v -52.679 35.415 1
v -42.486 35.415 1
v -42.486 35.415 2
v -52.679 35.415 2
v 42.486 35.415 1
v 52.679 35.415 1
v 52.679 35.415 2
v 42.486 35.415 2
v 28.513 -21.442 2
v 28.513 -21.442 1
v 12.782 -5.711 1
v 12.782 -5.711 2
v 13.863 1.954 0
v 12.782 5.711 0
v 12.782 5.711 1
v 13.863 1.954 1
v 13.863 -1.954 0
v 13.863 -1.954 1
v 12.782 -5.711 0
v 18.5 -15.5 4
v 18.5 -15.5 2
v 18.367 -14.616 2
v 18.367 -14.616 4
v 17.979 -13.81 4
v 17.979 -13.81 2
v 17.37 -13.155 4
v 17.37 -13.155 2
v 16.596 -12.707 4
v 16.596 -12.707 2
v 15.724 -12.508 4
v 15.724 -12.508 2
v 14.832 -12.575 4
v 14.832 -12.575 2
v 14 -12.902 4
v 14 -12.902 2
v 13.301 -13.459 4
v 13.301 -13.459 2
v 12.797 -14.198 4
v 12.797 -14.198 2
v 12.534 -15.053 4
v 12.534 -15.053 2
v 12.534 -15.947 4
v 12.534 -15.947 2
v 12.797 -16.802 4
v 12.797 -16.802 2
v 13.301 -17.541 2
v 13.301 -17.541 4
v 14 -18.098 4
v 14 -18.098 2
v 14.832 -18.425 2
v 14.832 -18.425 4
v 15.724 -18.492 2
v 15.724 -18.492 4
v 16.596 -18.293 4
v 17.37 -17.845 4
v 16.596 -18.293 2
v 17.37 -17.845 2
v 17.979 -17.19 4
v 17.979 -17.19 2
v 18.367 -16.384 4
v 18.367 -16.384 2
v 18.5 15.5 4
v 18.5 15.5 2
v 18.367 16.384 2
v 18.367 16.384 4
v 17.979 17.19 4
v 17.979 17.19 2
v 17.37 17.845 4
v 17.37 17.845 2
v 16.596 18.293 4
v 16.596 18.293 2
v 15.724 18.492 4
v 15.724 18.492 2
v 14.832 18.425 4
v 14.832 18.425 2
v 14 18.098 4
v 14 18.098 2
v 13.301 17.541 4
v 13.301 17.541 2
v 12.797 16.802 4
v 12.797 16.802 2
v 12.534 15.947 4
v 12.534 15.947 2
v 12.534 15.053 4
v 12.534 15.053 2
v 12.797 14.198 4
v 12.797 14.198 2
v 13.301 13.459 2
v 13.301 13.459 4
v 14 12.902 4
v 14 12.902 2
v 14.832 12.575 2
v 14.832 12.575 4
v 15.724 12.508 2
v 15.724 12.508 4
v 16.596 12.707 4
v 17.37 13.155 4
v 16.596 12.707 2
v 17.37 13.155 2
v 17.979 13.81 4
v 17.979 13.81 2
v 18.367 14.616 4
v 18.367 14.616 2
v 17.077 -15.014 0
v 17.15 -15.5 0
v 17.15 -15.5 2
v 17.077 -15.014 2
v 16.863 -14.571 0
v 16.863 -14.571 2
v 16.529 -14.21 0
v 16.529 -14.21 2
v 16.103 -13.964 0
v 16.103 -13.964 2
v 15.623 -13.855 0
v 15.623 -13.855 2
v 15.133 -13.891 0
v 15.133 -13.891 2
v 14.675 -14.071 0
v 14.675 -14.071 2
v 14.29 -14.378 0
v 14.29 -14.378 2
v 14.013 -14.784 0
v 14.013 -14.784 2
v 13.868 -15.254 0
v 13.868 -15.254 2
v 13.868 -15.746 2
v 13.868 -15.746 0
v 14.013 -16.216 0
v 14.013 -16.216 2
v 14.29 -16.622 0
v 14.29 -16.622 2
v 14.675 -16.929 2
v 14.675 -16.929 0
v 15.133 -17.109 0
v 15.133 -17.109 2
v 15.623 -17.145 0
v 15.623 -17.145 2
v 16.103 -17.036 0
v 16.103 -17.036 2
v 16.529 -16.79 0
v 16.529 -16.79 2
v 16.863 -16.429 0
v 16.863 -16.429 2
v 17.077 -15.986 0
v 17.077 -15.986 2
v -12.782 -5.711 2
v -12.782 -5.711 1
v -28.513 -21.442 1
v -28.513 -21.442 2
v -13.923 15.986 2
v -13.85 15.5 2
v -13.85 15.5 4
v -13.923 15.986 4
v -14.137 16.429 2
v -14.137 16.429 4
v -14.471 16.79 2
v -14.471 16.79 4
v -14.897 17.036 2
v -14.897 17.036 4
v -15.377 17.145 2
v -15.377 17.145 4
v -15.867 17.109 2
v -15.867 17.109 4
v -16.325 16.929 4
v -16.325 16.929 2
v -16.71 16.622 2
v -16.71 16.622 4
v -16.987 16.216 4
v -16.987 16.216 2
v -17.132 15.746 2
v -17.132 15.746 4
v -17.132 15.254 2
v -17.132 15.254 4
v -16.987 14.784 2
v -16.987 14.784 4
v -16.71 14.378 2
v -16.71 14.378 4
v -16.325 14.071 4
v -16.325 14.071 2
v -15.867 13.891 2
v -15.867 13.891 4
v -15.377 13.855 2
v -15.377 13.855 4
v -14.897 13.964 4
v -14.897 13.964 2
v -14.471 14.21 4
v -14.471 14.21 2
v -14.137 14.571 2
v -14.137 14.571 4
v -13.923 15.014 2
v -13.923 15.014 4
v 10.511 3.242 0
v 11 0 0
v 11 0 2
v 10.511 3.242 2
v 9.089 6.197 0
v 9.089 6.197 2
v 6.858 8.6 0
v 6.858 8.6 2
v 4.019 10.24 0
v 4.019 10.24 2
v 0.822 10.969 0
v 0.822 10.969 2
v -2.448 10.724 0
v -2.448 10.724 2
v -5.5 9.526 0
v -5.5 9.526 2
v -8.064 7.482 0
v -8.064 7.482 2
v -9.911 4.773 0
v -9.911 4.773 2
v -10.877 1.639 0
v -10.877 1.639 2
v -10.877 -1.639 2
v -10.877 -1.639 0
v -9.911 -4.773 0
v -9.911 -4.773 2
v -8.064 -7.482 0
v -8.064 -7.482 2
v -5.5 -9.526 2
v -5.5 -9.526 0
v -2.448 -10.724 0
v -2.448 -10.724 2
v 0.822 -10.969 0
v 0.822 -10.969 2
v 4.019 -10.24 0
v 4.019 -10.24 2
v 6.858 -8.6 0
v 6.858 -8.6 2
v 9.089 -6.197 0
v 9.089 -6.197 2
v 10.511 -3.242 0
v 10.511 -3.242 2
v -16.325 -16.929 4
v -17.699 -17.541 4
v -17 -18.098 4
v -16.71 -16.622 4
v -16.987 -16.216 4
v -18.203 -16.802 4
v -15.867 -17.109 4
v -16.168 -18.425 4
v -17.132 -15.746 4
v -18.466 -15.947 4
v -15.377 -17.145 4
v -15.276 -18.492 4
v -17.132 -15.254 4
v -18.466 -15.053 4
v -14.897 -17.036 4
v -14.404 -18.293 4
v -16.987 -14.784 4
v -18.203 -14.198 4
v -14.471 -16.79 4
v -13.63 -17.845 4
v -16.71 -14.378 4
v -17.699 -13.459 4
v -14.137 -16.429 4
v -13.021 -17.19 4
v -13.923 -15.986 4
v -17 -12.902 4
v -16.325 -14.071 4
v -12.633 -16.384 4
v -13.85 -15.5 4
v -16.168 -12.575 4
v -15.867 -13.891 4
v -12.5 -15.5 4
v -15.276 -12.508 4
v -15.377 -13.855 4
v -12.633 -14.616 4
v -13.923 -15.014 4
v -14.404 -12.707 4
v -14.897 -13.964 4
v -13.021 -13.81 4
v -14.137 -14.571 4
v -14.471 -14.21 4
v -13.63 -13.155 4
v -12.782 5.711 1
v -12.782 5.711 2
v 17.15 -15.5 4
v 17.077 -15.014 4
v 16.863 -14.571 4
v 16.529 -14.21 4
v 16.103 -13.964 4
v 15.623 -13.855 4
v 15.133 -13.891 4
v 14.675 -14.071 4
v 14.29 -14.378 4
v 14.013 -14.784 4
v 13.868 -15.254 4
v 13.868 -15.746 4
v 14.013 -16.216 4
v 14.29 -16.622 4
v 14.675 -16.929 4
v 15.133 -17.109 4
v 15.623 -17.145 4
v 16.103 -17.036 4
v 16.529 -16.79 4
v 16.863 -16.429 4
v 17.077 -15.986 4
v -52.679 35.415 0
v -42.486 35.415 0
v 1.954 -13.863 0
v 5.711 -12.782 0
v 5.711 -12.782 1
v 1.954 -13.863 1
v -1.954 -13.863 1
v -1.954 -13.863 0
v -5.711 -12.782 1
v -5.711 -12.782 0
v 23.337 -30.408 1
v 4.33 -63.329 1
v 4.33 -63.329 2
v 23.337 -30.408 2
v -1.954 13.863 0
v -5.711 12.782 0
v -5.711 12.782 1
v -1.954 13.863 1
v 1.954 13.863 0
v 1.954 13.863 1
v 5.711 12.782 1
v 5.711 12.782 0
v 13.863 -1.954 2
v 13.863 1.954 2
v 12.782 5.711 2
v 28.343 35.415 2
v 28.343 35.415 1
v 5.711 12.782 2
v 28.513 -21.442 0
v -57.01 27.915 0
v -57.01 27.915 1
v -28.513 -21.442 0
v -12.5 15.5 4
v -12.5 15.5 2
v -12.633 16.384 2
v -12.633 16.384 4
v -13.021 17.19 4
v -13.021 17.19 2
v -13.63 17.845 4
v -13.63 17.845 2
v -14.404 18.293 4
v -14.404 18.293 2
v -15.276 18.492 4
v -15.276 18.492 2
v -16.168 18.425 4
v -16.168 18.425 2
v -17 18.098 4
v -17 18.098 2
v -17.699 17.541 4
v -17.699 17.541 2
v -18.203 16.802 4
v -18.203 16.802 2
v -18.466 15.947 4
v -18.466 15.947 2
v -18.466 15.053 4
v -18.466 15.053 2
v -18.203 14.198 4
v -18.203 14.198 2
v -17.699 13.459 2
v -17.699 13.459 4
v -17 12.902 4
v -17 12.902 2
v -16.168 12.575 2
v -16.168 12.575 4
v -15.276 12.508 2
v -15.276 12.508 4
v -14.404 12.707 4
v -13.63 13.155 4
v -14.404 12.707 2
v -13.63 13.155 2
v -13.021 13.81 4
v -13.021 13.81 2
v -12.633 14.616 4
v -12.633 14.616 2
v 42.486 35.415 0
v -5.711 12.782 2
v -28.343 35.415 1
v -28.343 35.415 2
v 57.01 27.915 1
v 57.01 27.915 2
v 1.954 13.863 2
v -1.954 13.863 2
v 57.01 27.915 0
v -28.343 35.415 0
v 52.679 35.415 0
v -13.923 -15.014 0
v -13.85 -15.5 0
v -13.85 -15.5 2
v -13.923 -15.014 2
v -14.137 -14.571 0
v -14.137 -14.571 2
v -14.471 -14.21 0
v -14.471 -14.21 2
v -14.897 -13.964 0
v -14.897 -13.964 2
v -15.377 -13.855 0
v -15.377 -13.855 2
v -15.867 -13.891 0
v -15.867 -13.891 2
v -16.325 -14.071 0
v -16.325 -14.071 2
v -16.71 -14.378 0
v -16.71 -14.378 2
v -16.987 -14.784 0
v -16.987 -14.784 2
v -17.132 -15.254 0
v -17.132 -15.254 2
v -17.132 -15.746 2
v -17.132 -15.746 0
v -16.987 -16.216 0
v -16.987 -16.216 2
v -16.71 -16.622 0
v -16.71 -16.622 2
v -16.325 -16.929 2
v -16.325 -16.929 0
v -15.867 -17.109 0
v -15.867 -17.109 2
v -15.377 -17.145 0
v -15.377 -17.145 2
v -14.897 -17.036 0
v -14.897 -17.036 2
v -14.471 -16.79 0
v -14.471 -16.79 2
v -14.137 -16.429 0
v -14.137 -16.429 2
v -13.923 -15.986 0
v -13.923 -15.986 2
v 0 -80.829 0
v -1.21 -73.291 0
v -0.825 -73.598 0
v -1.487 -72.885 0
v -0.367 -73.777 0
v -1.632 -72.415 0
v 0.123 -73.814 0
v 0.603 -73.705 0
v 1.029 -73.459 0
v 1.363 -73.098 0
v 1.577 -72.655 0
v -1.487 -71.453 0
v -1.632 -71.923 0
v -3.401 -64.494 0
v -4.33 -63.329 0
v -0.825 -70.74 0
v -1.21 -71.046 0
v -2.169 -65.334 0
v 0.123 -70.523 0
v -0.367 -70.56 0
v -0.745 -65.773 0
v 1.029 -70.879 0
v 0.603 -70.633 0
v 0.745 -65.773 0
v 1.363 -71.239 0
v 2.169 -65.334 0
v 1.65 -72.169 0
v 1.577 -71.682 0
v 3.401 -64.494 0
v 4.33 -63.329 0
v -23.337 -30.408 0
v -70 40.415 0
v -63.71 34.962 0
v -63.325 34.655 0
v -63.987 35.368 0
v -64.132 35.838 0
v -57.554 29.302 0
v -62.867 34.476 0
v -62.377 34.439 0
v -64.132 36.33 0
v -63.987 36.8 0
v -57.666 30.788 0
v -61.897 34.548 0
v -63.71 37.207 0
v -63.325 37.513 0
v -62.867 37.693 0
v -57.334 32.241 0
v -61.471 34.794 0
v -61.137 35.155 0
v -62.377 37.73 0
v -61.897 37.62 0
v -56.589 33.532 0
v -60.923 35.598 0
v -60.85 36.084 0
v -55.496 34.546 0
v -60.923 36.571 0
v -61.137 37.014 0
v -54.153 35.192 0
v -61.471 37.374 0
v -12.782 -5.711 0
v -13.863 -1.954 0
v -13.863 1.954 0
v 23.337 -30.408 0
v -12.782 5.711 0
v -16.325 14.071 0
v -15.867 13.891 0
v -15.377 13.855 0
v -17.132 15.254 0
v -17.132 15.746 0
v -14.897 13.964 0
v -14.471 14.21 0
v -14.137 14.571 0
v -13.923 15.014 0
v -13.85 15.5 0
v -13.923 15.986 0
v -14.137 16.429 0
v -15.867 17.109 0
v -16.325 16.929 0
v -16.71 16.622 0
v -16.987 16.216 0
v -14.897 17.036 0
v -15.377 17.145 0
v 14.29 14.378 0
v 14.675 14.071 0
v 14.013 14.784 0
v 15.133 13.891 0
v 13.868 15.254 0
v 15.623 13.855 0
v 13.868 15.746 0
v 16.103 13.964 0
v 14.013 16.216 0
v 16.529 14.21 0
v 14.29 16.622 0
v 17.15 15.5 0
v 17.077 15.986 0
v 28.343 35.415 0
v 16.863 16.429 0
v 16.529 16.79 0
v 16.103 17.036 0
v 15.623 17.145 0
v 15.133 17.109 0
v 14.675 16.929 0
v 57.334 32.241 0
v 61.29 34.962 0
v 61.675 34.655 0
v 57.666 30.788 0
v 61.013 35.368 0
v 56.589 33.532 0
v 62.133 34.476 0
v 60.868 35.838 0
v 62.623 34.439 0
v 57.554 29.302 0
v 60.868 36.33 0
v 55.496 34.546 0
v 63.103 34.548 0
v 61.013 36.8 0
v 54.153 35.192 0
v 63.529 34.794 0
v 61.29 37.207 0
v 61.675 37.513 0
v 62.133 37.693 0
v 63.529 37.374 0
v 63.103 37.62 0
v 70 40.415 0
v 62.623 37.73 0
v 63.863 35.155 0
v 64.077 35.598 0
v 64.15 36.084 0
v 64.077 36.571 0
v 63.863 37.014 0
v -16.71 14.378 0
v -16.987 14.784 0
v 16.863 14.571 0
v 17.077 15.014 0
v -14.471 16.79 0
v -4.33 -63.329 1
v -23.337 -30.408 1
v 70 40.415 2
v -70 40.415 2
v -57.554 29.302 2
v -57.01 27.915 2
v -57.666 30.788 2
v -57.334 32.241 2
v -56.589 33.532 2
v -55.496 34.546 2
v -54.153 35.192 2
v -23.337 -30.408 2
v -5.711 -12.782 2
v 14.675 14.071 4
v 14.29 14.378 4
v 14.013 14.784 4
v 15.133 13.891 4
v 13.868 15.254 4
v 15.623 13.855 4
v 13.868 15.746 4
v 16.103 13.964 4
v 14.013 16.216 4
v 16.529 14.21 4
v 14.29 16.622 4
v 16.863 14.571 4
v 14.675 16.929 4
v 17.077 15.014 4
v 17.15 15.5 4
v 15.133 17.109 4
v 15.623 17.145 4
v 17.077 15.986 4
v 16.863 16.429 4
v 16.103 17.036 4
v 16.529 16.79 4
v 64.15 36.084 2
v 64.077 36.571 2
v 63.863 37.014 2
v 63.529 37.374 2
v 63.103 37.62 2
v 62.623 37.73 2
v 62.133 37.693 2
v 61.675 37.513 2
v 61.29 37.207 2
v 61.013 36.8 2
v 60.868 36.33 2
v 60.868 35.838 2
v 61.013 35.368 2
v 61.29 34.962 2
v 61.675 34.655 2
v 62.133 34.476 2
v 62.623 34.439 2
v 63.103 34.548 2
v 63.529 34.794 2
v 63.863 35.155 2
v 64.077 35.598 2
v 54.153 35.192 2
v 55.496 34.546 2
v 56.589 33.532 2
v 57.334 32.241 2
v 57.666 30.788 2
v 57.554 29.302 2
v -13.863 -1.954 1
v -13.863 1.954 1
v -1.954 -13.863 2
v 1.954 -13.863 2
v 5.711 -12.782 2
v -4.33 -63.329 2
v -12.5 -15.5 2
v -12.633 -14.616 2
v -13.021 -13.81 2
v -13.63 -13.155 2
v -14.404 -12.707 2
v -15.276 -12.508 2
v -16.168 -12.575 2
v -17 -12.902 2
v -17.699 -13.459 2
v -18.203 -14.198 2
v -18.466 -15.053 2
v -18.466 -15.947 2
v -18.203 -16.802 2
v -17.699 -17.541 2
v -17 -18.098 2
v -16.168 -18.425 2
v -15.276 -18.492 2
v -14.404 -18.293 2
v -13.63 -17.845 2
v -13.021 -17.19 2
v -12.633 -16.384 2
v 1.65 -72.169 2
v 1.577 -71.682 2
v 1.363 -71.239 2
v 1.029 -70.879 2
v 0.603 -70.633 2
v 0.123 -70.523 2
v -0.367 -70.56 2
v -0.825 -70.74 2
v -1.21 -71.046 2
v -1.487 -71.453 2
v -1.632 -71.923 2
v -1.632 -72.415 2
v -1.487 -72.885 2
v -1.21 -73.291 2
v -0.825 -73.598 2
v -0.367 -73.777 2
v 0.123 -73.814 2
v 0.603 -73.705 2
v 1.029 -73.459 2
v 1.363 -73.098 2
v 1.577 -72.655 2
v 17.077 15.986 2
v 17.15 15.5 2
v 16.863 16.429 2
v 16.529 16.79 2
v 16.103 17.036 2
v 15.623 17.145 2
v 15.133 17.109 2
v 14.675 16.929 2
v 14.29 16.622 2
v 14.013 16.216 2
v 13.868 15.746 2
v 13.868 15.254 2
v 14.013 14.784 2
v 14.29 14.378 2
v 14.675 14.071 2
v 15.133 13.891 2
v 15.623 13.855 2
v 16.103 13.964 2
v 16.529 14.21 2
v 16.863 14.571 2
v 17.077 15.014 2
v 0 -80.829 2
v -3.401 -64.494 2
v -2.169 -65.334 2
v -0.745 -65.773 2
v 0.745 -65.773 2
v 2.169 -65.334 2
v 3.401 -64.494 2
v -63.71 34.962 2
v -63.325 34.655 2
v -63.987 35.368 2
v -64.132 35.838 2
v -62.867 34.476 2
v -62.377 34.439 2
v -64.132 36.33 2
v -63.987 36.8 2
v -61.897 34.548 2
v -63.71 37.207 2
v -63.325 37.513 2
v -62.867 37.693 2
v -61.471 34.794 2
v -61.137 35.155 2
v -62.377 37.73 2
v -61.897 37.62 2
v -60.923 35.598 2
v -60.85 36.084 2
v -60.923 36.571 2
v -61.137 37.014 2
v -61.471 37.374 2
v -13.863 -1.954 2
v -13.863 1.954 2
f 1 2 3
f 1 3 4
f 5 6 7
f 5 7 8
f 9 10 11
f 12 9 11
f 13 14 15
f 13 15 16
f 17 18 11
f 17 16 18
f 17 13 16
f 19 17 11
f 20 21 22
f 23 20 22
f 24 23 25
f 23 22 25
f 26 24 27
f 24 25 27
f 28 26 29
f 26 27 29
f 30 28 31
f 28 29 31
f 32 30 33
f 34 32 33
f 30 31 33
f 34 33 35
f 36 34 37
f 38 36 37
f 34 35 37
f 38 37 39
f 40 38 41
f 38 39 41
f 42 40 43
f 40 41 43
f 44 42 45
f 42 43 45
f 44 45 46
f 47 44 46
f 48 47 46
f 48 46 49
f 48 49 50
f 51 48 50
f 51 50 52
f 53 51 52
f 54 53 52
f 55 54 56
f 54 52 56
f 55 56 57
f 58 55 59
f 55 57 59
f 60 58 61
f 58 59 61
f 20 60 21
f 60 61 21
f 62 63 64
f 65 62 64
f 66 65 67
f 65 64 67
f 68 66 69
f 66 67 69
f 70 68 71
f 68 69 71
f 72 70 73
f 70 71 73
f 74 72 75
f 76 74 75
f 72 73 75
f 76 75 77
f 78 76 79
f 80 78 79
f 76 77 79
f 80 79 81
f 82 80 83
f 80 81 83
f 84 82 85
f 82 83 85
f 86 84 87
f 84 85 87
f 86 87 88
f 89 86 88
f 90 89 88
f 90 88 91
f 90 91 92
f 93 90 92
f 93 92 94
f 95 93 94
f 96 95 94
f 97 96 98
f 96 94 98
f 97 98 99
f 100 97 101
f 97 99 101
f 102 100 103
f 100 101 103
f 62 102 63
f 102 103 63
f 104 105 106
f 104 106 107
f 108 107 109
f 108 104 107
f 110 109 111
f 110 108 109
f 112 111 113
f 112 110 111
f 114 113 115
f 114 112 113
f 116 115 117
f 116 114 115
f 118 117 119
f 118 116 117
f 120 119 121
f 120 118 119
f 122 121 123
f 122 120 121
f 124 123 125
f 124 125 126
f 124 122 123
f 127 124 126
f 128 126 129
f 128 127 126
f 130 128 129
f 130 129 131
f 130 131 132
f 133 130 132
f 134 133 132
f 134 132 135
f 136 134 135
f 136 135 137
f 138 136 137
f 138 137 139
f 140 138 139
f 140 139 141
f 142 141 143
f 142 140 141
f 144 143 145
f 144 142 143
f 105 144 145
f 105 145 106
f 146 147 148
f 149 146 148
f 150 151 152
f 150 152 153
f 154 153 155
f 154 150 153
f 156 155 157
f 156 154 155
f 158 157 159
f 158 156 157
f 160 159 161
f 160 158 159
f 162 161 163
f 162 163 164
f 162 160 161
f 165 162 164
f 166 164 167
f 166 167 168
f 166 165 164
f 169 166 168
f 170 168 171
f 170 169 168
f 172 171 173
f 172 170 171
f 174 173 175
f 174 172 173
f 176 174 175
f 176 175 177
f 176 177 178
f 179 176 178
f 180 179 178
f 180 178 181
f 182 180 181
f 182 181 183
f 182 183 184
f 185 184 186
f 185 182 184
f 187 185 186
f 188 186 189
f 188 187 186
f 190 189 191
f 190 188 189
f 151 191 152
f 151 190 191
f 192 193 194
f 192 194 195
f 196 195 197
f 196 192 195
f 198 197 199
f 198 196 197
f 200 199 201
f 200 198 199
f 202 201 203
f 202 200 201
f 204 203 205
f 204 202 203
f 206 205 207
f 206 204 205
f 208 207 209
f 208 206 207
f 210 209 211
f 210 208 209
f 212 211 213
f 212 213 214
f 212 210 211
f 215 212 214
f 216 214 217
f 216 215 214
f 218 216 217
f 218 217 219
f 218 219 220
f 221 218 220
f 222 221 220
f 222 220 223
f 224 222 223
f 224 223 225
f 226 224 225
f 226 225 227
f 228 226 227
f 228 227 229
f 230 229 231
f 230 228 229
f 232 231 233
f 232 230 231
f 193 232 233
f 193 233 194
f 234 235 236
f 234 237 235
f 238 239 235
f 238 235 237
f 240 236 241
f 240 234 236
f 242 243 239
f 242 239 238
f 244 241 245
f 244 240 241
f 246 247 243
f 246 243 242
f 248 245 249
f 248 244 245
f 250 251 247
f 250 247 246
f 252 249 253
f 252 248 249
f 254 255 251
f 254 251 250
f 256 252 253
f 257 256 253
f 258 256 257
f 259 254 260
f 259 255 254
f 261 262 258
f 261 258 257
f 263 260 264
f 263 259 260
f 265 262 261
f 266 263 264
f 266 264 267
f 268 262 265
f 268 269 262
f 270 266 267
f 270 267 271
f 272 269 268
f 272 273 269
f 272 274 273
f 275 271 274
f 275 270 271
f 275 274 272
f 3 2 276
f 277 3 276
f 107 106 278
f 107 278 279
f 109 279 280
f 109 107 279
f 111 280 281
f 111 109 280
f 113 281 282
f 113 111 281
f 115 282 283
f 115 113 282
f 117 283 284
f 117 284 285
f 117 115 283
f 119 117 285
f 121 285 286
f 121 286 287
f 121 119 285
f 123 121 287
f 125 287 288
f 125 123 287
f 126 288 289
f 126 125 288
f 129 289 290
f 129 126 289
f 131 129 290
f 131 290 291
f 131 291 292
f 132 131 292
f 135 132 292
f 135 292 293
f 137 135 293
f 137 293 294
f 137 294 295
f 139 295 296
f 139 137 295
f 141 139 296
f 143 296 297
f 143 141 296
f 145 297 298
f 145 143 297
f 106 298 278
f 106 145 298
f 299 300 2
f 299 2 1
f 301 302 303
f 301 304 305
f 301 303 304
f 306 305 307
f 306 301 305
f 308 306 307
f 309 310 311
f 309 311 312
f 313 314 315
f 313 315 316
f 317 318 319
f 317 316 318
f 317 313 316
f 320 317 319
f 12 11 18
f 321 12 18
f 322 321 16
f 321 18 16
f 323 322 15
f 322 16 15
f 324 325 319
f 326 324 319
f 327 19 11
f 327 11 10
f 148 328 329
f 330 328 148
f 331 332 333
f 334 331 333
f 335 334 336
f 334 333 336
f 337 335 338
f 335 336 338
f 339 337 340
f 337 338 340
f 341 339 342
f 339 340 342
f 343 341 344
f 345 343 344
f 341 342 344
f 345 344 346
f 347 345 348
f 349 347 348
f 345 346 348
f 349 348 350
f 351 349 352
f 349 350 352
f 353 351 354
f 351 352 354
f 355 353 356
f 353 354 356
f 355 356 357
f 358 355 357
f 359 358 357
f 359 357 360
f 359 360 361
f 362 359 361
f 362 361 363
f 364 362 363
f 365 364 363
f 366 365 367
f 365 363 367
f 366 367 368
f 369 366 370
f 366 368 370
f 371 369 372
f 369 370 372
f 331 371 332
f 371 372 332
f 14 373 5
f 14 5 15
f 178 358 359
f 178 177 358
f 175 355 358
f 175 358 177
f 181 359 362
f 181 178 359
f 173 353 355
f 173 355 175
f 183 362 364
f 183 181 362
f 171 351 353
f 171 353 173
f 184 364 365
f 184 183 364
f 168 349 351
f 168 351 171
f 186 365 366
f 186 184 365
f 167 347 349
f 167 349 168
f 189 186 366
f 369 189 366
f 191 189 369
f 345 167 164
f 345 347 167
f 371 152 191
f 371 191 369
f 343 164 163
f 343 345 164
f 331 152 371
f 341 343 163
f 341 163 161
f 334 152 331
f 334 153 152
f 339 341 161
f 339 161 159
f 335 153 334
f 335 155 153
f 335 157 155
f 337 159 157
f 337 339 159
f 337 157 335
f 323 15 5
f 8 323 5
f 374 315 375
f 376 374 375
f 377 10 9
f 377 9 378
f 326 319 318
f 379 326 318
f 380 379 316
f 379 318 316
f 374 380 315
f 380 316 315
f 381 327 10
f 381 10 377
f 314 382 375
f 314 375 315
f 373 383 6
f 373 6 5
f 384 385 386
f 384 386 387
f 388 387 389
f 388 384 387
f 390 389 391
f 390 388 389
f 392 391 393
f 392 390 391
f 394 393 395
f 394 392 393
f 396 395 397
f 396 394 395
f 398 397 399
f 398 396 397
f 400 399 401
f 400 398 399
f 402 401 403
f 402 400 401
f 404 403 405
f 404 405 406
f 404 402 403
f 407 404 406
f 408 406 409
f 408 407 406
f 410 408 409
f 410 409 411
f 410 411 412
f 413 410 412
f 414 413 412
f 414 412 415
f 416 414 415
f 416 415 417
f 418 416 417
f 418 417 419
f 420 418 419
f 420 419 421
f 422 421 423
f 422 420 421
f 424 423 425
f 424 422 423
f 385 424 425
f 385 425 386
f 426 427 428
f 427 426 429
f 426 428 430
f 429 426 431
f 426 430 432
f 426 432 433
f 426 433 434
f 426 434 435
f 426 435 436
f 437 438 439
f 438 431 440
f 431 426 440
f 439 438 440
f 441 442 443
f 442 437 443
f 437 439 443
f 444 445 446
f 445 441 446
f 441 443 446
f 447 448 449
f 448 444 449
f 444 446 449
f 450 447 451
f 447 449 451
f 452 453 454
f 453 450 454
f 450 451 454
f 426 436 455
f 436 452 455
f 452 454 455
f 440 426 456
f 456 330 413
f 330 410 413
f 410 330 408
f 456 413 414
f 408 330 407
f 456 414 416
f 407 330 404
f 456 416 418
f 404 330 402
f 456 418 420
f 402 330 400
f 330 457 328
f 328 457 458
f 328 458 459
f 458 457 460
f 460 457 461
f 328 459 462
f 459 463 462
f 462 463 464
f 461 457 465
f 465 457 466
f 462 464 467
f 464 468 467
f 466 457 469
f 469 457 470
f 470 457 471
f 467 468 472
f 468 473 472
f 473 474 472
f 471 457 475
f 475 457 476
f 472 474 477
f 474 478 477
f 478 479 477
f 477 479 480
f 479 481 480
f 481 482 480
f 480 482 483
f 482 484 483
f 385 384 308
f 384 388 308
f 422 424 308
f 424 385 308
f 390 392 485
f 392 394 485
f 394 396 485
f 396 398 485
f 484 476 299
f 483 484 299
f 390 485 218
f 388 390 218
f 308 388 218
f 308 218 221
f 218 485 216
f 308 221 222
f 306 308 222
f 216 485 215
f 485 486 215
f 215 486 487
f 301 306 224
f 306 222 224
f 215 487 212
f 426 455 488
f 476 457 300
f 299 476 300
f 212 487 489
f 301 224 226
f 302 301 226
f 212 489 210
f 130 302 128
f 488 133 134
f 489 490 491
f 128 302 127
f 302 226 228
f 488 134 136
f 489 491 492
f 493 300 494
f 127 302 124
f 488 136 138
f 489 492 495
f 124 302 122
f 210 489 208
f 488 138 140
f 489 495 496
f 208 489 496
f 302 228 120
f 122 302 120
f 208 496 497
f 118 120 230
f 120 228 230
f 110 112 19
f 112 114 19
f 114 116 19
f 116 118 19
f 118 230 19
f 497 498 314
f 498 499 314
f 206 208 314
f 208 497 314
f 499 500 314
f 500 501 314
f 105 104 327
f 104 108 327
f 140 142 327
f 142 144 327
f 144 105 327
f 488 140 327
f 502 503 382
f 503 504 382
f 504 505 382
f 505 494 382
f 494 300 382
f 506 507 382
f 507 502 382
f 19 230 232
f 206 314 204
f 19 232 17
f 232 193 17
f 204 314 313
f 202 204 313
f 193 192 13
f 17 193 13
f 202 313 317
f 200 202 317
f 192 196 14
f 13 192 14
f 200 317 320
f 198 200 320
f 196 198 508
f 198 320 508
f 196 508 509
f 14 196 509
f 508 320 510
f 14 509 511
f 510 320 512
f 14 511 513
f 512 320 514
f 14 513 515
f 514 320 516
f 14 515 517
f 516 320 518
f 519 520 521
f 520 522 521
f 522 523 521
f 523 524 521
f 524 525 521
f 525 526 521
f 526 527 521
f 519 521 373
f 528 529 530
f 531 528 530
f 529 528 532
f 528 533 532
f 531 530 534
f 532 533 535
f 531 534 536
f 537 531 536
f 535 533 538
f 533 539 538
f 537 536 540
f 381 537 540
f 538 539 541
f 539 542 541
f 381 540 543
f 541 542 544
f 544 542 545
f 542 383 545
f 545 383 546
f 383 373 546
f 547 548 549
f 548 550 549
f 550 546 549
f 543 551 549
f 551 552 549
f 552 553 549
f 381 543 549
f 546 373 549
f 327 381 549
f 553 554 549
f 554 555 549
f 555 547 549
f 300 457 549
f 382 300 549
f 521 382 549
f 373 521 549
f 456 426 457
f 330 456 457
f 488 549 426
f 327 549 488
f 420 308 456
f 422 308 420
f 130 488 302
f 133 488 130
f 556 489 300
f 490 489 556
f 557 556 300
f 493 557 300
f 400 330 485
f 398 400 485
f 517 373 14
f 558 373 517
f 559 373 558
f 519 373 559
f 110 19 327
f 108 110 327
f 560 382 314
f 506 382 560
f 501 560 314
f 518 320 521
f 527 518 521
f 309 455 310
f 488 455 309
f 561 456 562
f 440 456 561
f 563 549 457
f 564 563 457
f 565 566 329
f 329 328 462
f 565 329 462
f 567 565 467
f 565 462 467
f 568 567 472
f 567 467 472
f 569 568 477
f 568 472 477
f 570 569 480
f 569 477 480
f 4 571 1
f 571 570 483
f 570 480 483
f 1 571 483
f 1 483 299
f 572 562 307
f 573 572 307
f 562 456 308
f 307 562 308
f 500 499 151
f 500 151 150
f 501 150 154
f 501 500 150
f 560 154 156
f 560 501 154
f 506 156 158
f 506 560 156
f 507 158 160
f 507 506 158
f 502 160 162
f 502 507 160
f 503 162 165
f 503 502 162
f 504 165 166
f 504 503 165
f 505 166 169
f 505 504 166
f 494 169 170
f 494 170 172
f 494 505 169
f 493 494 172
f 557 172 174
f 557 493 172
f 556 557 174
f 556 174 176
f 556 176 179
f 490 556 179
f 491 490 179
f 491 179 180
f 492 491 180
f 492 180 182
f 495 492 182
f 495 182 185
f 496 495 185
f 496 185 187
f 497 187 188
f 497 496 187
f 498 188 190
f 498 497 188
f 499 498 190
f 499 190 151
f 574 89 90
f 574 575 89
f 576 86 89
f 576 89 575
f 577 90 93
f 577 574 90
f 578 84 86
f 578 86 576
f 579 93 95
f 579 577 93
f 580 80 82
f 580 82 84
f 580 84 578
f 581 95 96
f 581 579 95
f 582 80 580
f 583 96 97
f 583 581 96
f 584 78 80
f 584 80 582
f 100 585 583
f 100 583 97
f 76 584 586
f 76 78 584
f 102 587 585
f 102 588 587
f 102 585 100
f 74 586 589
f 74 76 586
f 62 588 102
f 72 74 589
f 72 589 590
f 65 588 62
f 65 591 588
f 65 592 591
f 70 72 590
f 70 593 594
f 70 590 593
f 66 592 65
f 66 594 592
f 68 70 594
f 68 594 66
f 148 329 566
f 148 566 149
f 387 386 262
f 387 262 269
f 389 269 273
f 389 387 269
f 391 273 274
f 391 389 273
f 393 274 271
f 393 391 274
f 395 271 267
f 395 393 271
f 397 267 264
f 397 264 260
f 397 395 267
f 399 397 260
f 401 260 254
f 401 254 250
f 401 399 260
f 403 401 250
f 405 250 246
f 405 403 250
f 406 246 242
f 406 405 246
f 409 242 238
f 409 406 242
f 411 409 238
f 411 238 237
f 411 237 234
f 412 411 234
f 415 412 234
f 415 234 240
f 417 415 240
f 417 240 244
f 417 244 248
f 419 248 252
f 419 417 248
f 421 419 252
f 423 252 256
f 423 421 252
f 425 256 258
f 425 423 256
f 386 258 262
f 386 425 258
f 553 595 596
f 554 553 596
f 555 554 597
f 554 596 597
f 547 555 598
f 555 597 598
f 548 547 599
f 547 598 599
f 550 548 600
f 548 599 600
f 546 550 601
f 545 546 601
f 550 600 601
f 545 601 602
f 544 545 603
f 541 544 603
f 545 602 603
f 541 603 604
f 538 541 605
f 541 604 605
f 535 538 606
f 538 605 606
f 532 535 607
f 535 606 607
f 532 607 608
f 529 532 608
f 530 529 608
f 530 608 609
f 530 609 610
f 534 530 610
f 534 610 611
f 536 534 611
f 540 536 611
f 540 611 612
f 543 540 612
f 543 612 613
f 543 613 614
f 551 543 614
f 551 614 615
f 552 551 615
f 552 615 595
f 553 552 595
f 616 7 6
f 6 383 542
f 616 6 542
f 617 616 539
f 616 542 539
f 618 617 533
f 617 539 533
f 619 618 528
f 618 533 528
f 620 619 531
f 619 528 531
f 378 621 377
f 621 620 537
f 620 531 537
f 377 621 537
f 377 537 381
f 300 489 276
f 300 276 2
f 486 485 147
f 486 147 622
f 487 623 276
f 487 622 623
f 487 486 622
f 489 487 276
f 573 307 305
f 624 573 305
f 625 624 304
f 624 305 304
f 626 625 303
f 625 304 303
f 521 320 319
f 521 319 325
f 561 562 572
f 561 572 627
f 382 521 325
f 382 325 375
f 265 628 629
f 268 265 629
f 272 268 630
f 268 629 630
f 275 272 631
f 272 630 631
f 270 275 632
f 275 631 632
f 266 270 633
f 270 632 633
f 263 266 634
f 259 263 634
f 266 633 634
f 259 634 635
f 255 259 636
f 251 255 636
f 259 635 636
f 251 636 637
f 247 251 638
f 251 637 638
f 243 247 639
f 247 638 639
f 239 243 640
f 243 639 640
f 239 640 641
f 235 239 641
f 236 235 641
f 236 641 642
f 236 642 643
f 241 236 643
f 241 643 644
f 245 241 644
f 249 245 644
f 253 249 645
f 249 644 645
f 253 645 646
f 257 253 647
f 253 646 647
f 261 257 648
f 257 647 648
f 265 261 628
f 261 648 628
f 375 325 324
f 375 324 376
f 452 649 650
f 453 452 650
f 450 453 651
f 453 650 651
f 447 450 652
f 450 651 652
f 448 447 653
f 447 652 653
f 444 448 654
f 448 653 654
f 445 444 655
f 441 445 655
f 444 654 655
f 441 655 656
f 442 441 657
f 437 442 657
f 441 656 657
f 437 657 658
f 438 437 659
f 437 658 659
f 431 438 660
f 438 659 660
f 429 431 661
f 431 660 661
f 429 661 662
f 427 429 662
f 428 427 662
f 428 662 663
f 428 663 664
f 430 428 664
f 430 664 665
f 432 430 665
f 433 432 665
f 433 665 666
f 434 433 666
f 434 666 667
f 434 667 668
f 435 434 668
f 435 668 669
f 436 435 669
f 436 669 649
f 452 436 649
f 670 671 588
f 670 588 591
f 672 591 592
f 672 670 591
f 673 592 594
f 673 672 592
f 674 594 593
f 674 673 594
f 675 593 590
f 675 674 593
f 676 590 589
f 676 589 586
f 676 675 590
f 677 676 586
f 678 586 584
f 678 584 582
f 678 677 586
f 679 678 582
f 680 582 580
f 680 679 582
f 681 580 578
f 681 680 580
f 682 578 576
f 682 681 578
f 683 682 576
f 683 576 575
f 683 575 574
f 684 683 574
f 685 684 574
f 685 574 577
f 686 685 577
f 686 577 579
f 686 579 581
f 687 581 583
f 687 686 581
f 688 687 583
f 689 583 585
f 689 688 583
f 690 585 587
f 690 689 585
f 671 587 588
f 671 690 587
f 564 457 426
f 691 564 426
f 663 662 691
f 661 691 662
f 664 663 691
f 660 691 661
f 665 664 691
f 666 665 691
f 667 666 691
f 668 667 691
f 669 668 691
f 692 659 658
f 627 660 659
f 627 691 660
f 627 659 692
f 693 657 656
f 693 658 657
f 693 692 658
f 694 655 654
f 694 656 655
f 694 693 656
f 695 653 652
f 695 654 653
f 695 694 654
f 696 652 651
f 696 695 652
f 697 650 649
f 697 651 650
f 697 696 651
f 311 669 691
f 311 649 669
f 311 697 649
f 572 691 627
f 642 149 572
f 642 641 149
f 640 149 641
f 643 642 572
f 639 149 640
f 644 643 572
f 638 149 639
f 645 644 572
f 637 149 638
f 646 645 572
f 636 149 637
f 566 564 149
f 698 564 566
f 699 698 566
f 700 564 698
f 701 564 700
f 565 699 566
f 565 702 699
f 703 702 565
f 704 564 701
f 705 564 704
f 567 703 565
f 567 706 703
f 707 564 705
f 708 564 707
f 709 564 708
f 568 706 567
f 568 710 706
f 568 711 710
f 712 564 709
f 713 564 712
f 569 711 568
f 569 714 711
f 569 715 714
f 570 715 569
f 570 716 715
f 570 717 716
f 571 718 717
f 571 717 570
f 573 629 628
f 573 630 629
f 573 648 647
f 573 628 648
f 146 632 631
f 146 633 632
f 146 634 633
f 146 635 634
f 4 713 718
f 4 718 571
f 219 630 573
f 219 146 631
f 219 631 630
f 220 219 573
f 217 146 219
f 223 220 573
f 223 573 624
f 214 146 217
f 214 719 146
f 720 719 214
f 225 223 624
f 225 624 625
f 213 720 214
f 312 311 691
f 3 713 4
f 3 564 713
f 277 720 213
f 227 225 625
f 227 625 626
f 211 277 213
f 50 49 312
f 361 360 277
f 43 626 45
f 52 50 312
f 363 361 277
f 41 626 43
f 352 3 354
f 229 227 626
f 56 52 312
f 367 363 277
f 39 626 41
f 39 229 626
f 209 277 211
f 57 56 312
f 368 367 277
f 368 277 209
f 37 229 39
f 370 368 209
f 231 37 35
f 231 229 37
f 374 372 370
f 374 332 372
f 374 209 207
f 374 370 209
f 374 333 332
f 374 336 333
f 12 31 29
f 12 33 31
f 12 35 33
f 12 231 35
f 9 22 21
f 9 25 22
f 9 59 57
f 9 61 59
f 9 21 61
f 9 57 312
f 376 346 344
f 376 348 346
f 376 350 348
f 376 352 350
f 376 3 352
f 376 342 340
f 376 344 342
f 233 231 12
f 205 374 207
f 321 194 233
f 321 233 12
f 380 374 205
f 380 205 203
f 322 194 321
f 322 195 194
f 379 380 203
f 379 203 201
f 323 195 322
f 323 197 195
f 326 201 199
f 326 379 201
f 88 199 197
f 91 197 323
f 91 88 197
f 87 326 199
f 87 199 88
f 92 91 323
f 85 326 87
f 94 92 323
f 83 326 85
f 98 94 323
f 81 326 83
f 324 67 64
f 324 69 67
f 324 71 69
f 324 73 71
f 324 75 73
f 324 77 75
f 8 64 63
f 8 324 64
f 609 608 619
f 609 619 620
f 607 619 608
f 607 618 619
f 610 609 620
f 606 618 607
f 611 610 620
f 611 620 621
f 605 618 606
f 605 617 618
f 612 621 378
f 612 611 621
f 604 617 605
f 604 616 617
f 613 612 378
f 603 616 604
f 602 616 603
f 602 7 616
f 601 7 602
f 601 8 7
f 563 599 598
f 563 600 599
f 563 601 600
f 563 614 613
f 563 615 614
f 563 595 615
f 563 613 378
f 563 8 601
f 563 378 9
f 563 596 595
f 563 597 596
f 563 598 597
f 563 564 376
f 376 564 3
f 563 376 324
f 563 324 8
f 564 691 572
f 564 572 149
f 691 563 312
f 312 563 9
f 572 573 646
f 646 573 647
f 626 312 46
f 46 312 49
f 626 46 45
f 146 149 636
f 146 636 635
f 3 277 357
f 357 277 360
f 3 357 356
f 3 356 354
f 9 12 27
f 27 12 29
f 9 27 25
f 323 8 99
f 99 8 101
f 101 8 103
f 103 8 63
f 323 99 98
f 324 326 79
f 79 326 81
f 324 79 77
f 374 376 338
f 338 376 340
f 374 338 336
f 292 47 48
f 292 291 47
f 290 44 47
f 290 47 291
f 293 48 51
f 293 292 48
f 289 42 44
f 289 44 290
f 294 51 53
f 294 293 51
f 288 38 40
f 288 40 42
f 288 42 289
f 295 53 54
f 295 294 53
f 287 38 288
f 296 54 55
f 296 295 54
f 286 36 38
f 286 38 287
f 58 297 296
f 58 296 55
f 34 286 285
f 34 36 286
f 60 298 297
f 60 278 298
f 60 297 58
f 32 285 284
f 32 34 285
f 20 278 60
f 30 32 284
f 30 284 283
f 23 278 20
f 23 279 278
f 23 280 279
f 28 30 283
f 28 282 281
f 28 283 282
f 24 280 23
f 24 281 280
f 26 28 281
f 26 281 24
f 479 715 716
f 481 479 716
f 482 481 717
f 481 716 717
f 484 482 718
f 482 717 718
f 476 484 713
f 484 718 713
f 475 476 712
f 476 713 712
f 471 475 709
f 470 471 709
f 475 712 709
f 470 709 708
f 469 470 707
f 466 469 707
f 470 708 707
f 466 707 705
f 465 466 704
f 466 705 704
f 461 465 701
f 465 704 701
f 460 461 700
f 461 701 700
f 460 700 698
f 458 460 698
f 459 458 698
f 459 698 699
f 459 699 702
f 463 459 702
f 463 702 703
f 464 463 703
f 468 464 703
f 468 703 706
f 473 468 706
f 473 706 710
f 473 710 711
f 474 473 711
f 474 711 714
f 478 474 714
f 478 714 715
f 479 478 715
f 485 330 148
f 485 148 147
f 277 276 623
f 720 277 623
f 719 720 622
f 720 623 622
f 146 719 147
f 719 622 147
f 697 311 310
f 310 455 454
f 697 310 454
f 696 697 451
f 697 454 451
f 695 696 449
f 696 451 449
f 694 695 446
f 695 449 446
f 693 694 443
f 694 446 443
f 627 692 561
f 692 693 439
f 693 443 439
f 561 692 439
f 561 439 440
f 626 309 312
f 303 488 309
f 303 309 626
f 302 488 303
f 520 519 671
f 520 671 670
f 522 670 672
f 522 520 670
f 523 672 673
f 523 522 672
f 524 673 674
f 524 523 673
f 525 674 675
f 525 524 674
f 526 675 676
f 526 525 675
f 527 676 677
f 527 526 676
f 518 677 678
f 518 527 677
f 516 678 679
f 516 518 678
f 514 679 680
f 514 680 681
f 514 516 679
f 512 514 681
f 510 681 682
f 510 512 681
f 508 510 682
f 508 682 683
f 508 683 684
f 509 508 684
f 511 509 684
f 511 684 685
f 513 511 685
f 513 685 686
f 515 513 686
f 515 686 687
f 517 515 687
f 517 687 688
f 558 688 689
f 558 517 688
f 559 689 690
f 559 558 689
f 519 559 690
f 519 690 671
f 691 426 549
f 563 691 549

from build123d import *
from build123d.topology import SkipClean

# Parameters (mm, degrees)
SKETCH1_R               = 1.65
SKETCH1_R_2             = 11
BOSS_EXTRUDE1_DEPTH     = 2
SHELL2_T                = -1
SKETCH3_R               = 4.65
SKETCH3_R_2             = 2.65
SKETCH3_R_3             = 14
SKETCH3_R_4             = 12
BOSS_EXTRUDE2_DEPTH     = 1
SKETCH4_R               = 4.65
BOSS_EXTRUDE3_DEPTH     = 1
CUT_EXTRUDE2_DEPTH      = 107.931442211
CUT_EXTRUDE2_DEPTH_BACK = 107.931442211
FILLET2_DEPTH           = 2
SKETCH7_R               = 1.65
CUT_EXTRUDE3_DEPTH      = 107.945468971
SKETCH8_R               = 3
SKETCH8_R_2             = 1.65
BOSS_EXTRUDE4_DEPTH     = 2


with BuildPart() as part:
    # Sketch1 → Boss-Extrude1 (new body)
    with BuildSketch(Plane.XY):
        Polygon((70, 40.414518843), (-70, 40.414518843), (0, -80.829037687), align=None)
        with Locations((-15.5, -15.5)):
            Circle(SKETCH1_R, mode=Mode.SUBTRACT)
        with Locations((15.5, -15.5)):
            Circle(SKETCH1_R, mode=Mode.SUBTRACT)
        with Locations((15.5, 15.5)):
            Circle(SKETCH1_R, mode=Mode.SUBTRACT)
        with Locations((-15.5, 15.5)):
            Circle(SKETCH1_R, mode=Mode.SUBTRACT)
        Circle(SKETCH1_R_2, mode=Mode.SUBTRACT)
    extrude(amount=BOSS_EXTRUDE1_DEPTH)

    # Shell2
    shell2_openings = [part.faces().sort_by_distance(p)[0] for p in [
        (0, 38.562492926, 2),
    ]]
    offset(amount=SHELL2_T, openings=shell2_openings, kind=Kind.INTERSECTION)

    # Sketch3 → Boss-Extrude2 (add)
    # profile 1 of 6: a face of its own
    with BuildSketch(Plane.XY.offset(1)):
        Polygon((68.267949192, 39.414518843), (-68.267949192, 39.414518843), (0, -78.829037687), align=None)
        Polygon((61.339745962, 35.414518843), (-61.339745962, 35.414518843), (0, -70.829037687), align=None, mode=Mode.SUBTRACT)
    # profile 2 of 6: a face of its own
    with BuildSketch(Plane.XY.offset(1)):
        with Locations((-15.5, -15.5)):
            Circle(SKETCH3_R)
        with Locations((-15.5, -15.5)):
            Circle(SKETCH3_R_2, mode=Mode.SUBTRACT)
    # profile 3 of 6: a face of its own
    with BuildSketch(Plane.XY.offset(1)):
        with Locations((15.5, -15.5)):
            Circle(SKETCH3_R)
        with Locations((15.5, -15.5)):
            Circle(SKETCH3_R_2, mode=Mode.SUBTRACT)
    # profile 4 of 6: a face of its own
    with BuildSketch(Plane.XY.offset(1)):
        Circle(SKETCH3_R_3)
        Circle(SKETCH3_R_4, mode=Mode.SUBTRACT)
    # profile 5 of 6: a face of its own
    with BuildSketch(Plane.XY.offset(1)):
        with Locations((15.5, 15.5)):
            Circle(SKETCH3_R)
        with Locations((15.5, 15.5)):
            Circle(SKETCH3_R_2, mode=Mode.SUBTRACT)
    # profile 6 of 6: a face of its own
    with BuildSketch(Plane.XY.offset(1)):
        with Locations((-15.5, 15.5)):
            Circle(SKETCH3_R)
        with Locations((-15.5, 15.5)):
            Circle(SKETCH3_R_2, mode=Mode.SUBTRACT)
    extrude(amount=BOSS_EXTRUDE2_DEPTH)

    # Sketch4 → Boss-Extrude3 (add)
    # profile 1 of 4: a face of its own
    with BuildSketch(Plane.XY.offset(1)):
        with BuildLine():
            Line((-23.337036668, -30.40810448), (-5.711087099, -12.78215491))
            ThreePointArc((-5.711087099, -12.78215491), (-9.899494937, -9.899494937), (-12.78215491, -5.711087099))
            Line((-12.78215491, -5.711087099), (-28.51341757, -21.442349758))
            Line((-28.51341757, -21.442349758), (-23.337036668, -30.40810448))
        make_face()
        with Locations((-15.5, -15.5)):
            Circle(SKETCH4_R, mode=Mode.SUBTRACT)
    # profile 2 of 4: a face of its own
    with BuildSketch(Plane.XY.offset(1)):
        with BuildLine():
            ThreePointArc((12.78215491, -5.711087099), (9.899494937, -9.899494937), (5.711087099, -12.78215491))
            Line((5.711087099, -12.78215491), (23.337036668, -30.40810448))
            Line((23.337036668, -30.40810448), (28.51341757, -21.442349758))
            Line((28.51341757, -21.442349758), (12.78215491, -5.711087099))
        make_face()
        with Locations((15.5, -15.5)):
            Circle(SKETCH4_R, mode=Mode.SUBTRACT)
    # profile 3 of 4: a face of its own
    with BuildSketch(Plane.XY.offset(1)):
        with BuildLine():
            ThreePointArc((5.711087099, 12.78215491), (9.899494937, 9.899494937), (12.78215491, 5.711087099))
            Line((12.78215491, 5.711087099), (42.485586655, 35.414518843))
            Line((42.485586655, 35.414518843), (28.343451031, 35.414518843))
            Line((28.343451031, 35.414518843), (5.711087099, 12.78215491))
        make_face()
        with Locations((15.5, 15.5)):
            Circle(SKETCH4_R, mode=Mode.SUBTRACT)
    # profile 4 of 4: a face of its own
    with BuildSketch(Plane.XY.offset(1)):
        with BuildLine():
            Line((-42.485586655, 35.414518843), (-12.78215491, 5.711087099))
            ThreePointArc((-12.78215491, 5.711087099), (-9.899494937, 9.899494937), (-5.711087099, 12.78215491))
            Line((-5.711087099, 12.78215491), (-28.343451031, 35.414518843))
            Line((-28.343451031, 35.414518843), (-42.485586655, 35.414518843))
        make_face()
        with Locations((-15.5, 15.5)):
            Circle(SKETCH4_R, mode=Mode.SUBTRACT)
    extrude(amount=BOSS_EXTRUDE3_DEPTH)

    # Sketch6 → Cut-Extrude2 (cut, two sides: drawn at the far end of the back side and taken through both)
    with BuildSketch(Plane.XY.offset(1).offset(-CUT_EXTRUDE2_DEPTH_BACK)):
        with BuildLine():
            Line((-12.78215491, 5.711087099), (-42.485586655, 35.414518843))
            Line((-42.485586655, 35.414518843), (-61.339745962, 35.414518843))
            Line((-61.339745962, 35.414518843), (-28.51341757, -21.442349758))
            Line((-28.51341757, -21.442349758), (-12.78215491, -5.711087099))
            ThreePointArc((-12.78215491, -5.711087099), (-14, 0), (-12.78215491, 5.711087099))
        make_face()
        with BuildLine():
            Line((0, -70.829037687), (23.337036668, -30.40810448))
            Line((23.337036668, -30.40810448), (5.711087099, -12.78215491))
            ThreePointArc((5.711087099, -12.78215491), (0, -14), (-5.711087099, -12.78215491))
            Line((-5.711087099, -12.78215491), (-23.337036668, -30.40810448))
            Line((-23.337036668, -30.40810448), (0, -70.829037687))
        make_face()
        with BuildLine():
            Line((42.485586655, 35.414518843), (12.78215491, 5.711087099))
            ThreePointArc((12.78215491, 5.711087099), (14, 0), (12.78215491, -5.711087099))
            Line((12.78215491, -5.711087099), (28.51341757, -21.442349758))
            Line((28.51341757, -21.442349758), (61.339745962, 35.414518843))
            Line((61.339745962, 35.414518843), (42.485586655, 35.414518843))
        make_face()
        with BuildLine():
            Line((-28.343451031, 35.414518843), (-5.711087099, 12.78215491))
            ThreePointArc((-5.711087099, 12.78215491), (0, 14), (5.711087099, 12.78215491))
            Line((5.711087099, 12.78215491), (28.343451031, 35.414518843))
            Line((28.343451031, 35.414518843), (-28.343451031, 35.414518843))
        make_face()
    extrude(amount=CUT_EXTRUDE2_DEPTH + CUT_EXTRUDE2_DEPTH_BACK, mode=Mode.SUBTRACT)

    # Fillet2: read off the stored shape, not the designer's step
    # Fillet2 outline → Fillet2 (add)
    with SkipClean():  # the faces are left unmerged after this step: merging them gives an invalid solid
        with BuildSketch(Plane.XY):
            with BuildLine():
                ThreePointArc((4.330127019, -63.329037687), (0, -65.829037687), (-4.330127019, -63.329037687))
                Line((-4.330127019, -63.329037687), (0, -70.829037687))
                Line((0, -70.829037687), (4.330127019, -63.329037687))
            make_face()
            with BuildLine():
                ThreePointArc((52.679491924, 35.414518843), (57.009618943, 32.914518843), (57.009618943, 27.914518843))
                Line((57.009618943, 27.914518843), (61.339745962, 35.414518843))
                Line((61.339745962, 35.414518843), (52.679491924, 35.414518843))
            make_face()
            with BuildLine():
                ThreePointArc((-57.009618943, 27.914518843), (-57.009618943, 32.914518843), (-52.679491924, 35.414518843))
                Line((-52.679491924, 35.414518843), (-61.339745962, 35.414518843))
                Line((-61.339745962, 35.414518843), (-57.009618943, 27.914518843))
            make_face()
        extrude(amount=FILLET2_DEPTH)
    add(part.part.scale(1), mode=Mode.REPLACE)  # the faces are merged on a copy

    # Sketch7 → Cut-Extrude3 (cut, through all)
    with BuildSketch(Plane.XY.offset(2)):
        with Locations((-62.5, 36.084391824)):
            Circle(SKETCH7_R)
        with Locations((62.5, 36.084391824)):
            Circle(SKETCH7_R)
        with Locations((0, -72.168783649)):
            Circle(SKETCH7_R)
    extrude(amount=-CUT_EXTRUDE3_DEPTH, mode=Mode.SUBTRACT)

    # Sketch8 → Boss-Extrude4 (add)
    # profile 1 of 4: a face of its own
    with BuildSketch(Plane.XY.offset(2)):
        with Locations((-15.5, 15.5)):
            Circle(SKETCH8_R)
        with Locations((-15.5, 15.5)):
            Circle(SKETCH8_R_2, mode=Mode.SUBTRACT)
    # profile 2 of 4: a face of its own
    with BuildSketch(Plane.XY.offset(2)):
        with Locations((15.5, 15.5)):
            Circle(SKETCH8_R)
        with Locations((15.5, 15.5)):
            Circle(SKETCH8_R_2, mode=Mode.SUBTRACT)
    # profile 3 of 4: a face of its own
    with BuildSketch(Plane.XY.offset(2)):
        with Locations((15.5, -15.5)):
            Circle(SKETCH8_R)
        with Locations((15.5, -15.5)):
            Circle(SKETCH8_R_2, mode=Mode.SUBTRACT)
    # profile 4 of 4: a face of its own
    with BuildSketch(Plane.XY.offset(2)):
        with Locations((-15.5, -15.5)):
            Circle(SKETCH8_R)
        with Locations((-15.5, -15.5)):
            Circle(SKETCH8_R_2, mode=Mode.SUBTRACT)
    extrude(amount=BOSS_EXTRUDE4_DEPTH)


solid = part.part
